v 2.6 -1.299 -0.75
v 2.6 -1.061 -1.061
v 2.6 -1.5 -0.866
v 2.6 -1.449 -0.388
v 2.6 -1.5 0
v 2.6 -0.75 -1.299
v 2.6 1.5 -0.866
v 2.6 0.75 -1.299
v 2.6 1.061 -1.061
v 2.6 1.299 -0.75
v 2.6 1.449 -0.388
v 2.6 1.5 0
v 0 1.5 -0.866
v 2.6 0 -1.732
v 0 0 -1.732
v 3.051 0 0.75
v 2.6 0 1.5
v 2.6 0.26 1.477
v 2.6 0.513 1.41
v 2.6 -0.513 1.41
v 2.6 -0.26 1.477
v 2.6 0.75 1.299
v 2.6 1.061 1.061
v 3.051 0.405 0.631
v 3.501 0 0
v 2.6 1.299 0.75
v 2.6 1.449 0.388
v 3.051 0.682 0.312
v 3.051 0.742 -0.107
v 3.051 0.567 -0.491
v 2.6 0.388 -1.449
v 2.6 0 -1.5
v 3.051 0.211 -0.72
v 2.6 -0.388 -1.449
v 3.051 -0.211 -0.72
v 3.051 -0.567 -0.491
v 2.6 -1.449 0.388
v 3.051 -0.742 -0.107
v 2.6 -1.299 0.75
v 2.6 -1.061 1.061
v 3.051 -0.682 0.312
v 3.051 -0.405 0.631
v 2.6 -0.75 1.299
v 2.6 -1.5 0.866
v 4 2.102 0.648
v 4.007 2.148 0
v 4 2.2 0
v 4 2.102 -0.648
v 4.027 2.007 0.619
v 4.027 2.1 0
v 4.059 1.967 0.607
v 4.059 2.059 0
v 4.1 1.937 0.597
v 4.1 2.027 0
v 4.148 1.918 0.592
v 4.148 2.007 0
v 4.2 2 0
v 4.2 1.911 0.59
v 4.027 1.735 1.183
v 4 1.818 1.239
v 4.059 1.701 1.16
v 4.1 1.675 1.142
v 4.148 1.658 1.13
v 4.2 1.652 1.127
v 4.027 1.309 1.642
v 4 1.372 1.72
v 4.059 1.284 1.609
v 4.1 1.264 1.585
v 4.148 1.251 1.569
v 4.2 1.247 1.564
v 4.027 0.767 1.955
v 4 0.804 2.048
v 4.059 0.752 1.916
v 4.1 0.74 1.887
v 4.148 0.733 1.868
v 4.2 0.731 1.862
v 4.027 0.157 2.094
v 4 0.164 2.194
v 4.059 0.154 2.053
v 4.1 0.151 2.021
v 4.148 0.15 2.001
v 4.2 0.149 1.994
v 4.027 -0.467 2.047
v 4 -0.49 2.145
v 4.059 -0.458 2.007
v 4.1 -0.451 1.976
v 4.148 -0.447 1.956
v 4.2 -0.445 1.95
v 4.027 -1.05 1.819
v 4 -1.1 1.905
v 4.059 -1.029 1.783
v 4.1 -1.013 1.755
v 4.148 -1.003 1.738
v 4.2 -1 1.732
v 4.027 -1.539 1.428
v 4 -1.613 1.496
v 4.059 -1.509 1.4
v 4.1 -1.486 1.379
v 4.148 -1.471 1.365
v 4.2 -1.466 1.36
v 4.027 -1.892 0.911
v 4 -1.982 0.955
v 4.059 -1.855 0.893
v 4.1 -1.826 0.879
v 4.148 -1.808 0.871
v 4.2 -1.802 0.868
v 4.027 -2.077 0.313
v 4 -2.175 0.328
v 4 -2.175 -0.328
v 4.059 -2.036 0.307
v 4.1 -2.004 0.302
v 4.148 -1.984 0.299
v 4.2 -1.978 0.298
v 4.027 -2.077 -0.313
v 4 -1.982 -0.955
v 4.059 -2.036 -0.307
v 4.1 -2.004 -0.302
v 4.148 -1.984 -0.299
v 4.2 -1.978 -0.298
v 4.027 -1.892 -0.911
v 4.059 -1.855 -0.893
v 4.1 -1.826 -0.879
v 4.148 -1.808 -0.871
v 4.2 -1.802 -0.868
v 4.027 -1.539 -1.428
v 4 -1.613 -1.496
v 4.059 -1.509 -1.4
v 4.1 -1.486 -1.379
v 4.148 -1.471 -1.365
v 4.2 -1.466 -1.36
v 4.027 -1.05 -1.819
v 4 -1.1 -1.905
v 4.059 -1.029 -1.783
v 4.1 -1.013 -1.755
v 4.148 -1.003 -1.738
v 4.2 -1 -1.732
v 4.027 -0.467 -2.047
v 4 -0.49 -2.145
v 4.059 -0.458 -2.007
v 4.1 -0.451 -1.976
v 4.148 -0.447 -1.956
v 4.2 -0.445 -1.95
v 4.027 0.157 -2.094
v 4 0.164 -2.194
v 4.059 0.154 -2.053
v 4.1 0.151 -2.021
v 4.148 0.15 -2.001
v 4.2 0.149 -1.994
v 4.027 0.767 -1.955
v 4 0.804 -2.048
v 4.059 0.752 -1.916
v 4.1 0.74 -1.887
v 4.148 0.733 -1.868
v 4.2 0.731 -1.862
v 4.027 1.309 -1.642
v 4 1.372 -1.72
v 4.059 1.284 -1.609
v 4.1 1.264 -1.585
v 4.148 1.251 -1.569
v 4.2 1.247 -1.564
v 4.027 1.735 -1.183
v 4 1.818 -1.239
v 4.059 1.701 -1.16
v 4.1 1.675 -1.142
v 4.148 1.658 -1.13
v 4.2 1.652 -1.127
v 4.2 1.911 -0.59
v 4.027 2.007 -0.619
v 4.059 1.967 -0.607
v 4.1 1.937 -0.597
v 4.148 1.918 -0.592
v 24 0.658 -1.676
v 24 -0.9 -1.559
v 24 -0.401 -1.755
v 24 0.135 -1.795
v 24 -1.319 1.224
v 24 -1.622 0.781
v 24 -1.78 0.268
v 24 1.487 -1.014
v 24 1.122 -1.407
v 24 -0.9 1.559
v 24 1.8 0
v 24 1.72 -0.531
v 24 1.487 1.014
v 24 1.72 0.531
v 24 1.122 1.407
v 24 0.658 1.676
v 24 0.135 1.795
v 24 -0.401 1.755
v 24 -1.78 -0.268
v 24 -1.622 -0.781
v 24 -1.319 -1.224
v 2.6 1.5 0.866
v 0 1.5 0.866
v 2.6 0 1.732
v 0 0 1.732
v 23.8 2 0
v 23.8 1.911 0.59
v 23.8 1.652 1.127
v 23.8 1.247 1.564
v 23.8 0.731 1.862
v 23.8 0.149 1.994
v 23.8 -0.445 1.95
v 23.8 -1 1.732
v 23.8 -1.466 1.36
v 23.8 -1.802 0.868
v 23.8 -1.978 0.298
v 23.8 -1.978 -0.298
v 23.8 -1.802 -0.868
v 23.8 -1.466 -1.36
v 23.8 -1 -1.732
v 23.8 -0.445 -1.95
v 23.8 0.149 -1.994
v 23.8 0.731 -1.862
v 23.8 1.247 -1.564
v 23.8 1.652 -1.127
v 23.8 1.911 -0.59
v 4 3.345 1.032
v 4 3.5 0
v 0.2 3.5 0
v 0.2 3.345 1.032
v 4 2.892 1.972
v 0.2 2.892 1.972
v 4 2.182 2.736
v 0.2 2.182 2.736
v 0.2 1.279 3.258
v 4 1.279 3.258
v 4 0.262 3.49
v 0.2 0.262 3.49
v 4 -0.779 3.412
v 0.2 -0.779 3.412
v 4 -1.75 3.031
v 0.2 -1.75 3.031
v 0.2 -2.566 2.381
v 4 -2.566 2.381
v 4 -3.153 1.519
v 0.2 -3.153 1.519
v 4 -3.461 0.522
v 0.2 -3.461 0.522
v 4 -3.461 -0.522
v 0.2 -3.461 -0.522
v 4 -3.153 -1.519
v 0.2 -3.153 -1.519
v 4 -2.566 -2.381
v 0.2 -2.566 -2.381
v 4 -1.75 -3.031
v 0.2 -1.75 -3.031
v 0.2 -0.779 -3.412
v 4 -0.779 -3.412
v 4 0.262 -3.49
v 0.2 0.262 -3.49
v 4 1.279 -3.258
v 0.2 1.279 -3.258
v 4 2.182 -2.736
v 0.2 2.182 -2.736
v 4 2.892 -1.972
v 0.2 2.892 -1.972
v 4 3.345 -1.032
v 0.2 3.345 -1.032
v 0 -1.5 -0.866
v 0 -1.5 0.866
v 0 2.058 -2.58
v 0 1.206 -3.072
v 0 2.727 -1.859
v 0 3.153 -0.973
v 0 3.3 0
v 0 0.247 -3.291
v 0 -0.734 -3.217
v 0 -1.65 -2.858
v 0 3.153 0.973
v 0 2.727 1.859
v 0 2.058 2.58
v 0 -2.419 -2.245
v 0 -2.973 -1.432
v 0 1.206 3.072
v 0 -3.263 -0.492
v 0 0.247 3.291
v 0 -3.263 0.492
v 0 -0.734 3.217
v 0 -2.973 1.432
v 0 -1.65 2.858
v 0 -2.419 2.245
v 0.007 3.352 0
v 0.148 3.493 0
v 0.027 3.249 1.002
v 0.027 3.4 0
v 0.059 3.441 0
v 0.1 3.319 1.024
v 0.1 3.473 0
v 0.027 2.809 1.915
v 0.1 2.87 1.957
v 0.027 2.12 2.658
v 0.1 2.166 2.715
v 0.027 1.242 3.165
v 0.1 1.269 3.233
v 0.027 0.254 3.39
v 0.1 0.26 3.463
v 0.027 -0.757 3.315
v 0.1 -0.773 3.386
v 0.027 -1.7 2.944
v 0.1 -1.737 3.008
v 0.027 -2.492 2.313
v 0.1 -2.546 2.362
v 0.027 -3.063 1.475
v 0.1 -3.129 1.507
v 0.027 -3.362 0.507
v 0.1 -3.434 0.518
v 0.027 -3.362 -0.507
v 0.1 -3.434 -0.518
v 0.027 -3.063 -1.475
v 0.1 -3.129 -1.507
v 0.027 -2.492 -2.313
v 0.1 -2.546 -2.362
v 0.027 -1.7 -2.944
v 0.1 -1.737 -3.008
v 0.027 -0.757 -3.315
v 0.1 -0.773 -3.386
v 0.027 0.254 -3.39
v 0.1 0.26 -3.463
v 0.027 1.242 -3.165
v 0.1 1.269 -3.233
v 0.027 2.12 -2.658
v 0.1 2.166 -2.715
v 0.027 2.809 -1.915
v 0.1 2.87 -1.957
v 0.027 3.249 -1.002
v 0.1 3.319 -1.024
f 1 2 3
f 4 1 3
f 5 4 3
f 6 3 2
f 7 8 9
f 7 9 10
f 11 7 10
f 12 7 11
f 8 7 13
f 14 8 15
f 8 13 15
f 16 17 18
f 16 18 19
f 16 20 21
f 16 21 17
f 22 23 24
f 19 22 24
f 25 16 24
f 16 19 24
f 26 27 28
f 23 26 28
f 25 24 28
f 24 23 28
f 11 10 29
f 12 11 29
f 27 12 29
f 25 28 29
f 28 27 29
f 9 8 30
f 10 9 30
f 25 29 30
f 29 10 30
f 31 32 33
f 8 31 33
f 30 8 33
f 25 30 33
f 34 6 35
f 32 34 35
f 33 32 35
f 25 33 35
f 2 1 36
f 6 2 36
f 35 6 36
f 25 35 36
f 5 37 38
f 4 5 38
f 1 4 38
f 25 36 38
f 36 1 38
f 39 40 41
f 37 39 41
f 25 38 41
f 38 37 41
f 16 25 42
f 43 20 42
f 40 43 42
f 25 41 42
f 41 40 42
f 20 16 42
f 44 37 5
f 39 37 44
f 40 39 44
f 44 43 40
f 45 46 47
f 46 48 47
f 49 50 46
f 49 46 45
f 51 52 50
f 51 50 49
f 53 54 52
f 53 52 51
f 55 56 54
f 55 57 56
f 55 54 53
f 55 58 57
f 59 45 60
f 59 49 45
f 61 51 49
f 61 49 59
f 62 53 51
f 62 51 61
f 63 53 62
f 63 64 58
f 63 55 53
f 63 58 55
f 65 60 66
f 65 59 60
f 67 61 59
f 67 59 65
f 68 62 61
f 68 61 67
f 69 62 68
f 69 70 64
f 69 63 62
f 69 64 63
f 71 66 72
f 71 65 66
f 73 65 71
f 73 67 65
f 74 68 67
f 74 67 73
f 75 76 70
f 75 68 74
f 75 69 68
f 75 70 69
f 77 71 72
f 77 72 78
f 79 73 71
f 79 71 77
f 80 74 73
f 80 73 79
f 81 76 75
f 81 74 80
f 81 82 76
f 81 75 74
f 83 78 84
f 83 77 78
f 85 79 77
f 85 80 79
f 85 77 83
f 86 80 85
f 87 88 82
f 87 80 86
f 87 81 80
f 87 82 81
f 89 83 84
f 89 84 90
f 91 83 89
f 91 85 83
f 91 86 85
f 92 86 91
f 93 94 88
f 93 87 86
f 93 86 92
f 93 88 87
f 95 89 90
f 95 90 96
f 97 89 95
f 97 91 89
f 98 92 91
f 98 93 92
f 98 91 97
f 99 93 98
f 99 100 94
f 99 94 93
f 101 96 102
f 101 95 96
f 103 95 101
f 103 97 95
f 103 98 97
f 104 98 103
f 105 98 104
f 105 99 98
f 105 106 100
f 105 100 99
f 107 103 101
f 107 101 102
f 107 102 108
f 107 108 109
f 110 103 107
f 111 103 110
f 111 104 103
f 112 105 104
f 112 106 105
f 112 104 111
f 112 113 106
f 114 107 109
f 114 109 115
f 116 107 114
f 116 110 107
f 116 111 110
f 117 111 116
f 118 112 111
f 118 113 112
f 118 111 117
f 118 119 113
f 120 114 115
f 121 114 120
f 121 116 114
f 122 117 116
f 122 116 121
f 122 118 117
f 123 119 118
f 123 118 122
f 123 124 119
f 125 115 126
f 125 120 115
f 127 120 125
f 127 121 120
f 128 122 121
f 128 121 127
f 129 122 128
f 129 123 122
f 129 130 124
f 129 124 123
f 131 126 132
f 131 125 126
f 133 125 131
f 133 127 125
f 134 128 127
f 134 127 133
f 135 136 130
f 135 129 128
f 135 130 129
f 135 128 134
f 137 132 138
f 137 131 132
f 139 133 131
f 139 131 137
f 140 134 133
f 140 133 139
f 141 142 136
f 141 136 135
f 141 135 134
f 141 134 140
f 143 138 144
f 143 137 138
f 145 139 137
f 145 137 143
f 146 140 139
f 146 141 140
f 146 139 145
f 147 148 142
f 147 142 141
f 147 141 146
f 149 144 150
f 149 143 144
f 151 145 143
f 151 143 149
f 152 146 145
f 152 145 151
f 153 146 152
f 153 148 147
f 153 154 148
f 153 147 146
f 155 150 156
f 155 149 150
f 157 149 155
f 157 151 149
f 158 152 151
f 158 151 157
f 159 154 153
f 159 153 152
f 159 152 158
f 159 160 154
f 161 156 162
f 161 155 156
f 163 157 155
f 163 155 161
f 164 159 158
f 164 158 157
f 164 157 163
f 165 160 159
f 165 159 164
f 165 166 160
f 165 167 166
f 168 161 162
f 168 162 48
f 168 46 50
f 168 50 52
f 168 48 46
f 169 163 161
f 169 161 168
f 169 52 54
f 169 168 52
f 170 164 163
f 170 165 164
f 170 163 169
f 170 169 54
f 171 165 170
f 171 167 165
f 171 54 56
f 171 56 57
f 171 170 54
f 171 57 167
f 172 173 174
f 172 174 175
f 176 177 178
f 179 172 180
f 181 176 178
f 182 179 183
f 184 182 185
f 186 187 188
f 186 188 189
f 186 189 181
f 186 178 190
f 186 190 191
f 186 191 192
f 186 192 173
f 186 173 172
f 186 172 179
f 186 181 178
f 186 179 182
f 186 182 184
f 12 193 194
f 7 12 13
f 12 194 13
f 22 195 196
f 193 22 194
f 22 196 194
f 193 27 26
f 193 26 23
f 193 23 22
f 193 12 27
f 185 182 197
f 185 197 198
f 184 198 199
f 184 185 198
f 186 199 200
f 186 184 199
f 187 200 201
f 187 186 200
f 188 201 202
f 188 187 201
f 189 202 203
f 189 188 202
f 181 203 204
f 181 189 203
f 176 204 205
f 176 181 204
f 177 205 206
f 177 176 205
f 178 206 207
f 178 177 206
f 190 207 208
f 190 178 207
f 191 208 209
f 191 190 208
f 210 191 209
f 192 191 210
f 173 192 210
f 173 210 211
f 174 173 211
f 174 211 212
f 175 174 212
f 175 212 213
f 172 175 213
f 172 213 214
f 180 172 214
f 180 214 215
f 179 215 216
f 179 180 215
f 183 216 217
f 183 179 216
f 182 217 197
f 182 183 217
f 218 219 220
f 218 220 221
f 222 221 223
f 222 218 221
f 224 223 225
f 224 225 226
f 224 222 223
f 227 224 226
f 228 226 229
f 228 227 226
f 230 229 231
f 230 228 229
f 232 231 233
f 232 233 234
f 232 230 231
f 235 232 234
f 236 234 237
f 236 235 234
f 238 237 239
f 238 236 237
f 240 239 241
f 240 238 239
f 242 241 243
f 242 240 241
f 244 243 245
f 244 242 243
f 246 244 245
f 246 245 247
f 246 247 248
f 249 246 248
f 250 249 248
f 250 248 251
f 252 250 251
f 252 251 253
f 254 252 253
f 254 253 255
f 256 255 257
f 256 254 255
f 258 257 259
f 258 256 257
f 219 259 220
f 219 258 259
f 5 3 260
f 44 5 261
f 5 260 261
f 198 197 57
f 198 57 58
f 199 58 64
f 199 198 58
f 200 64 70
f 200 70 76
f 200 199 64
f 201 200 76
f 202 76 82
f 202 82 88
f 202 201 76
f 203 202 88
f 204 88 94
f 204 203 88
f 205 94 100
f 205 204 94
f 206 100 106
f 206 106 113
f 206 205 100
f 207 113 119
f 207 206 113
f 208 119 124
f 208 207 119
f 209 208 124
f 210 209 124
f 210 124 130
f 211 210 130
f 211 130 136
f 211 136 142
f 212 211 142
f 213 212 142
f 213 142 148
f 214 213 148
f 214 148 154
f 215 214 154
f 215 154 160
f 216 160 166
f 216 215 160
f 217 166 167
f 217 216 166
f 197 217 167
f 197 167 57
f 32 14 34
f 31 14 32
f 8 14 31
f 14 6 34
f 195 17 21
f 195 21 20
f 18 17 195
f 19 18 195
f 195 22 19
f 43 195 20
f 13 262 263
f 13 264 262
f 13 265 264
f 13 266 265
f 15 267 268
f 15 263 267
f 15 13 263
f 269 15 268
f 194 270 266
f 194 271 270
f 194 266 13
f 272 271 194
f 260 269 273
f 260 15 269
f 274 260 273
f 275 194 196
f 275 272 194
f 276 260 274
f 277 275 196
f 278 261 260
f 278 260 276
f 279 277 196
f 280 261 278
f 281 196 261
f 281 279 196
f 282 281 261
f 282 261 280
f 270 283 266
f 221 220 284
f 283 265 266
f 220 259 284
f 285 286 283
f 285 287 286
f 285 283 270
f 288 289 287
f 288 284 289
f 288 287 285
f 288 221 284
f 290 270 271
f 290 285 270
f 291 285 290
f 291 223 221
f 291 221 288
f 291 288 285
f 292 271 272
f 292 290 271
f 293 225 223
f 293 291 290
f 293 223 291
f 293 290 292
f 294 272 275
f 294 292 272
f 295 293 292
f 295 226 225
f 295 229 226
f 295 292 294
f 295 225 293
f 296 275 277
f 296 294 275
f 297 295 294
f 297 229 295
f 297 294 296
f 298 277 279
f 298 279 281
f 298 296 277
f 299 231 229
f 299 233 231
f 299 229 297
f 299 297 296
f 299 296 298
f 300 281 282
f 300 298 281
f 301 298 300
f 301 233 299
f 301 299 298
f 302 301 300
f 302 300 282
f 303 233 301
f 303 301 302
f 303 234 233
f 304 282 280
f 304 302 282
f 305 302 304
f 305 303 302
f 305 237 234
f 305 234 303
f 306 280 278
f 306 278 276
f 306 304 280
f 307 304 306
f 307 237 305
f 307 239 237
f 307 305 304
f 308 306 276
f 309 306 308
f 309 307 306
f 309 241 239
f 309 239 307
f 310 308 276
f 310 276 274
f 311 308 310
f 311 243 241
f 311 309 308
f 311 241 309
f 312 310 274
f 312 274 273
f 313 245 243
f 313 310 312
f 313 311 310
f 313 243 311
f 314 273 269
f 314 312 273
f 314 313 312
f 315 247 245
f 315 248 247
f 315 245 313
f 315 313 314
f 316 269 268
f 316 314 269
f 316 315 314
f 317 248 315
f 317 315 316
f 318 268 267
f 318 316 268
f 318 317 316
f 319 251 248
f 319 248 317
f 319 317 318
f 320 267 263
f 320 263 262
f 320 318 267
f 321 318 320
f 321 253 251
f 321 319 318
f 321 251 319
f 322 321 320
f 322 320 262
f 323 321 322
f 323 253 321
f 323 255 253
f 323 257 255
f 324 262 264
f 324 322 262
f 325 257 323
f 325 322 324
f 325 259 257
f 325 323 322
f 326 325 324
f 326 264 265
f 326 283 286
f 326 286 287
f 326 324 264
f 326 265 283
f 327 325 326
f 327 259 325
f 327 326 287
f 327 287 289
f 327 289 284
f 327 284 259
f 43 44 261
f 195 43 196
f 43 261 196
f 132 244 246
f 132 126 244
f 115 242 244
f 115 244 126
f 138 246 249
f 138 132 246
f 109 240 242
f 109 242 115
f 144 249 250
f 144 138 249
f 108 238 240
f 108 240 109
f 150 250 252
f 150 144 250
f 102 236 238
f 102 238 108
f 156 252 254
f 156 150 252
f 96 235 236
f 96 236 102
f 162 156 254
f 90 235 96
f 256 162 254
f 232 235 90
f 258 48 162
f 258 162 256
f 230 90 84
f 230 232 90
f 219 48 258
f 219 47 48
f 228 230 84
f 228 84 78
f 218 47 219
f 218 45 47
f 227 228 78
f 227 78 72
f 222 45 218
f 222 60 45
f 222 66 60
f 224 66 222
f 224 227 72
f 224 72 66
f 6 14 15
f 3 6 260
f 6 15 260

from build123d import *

# Parameters (mm, degrees)
HOLE_WIZARD_3_0_3_1_D     = 3
HOLE_WIZARD_3_0_3_1_DEPTH = 2.6
HOLE_WIZARD_3_0_3_1_TIP   = 0.901290929
CUT_EXTRUDE_1_DEPTH       = 2.6
FILLET_1_R                = 0.2
CHAMFER_1_SIZE            = 0.2


with BuildPart() as part:
    # 草图1 → 旋转1 (revolve)
    with BuildSketch(Plane.XY):
        Polygon((0, 0), (0, 3.5), (4, 3.5), (4, 2), (24, 2), (24, 0), align=None)
    revolve(axis=Axis((0, 0, 0), (1, 0, 0)))

    # Ø3.0 (3) 直径孔1
    with Locations(Plane.ZY):
        with Locations((0, 0)):
            Hole(HOLE_WIZARD_3_0_3_1_D / 2, depth=HOLE_WIZARD_3_0_3_1_DEPTH)
            with Locations((0, 0, -(HOLE_WIZARD_3_0_3_1_DEPTH + HOLE_WIZARD_3_0_3_1_TIP / 2))):  # 118° drill point
                Cone(0, HOLE_WIZARD_3_0_3_1_D / 2, HOLE_WIZARD_3_0_3_1_TIP, mode=Mode.SUBTRACT)

    # 草图2 → 切除-拉伸1 (cut)
    with BuildSketch(Plane.ZY):
        Polygon((0.866025404, 1.5), (-0.866025404, 1.5), (-1.732050808, 0), (-0.866025404, -1.5), (0.866025404, -1.5), (1.732050808, 0), align=None)
    extrude(amount=-CUT_EXTRUDE_1_DEPTH, mode=Mode.SUBTRACT)

    # 圆角1
    fillet_1_edges = [part.edges().sort_by_distance(p)[0] for p in [
        (4, -2, 0),
        (0, -3.5, 0),
    ]]
    fillet(fillet_1_edges, radius=FILLET_1_R)

    # 倒角1
    chamfer_1_edges = [part.edges().sort_by_distance(p)[0] for p in [
        (24, -2, 0),
    ]]
    chamfer(chamfer_1_edges, length=CHAMFER_1_SIZE)


solid = part.part
